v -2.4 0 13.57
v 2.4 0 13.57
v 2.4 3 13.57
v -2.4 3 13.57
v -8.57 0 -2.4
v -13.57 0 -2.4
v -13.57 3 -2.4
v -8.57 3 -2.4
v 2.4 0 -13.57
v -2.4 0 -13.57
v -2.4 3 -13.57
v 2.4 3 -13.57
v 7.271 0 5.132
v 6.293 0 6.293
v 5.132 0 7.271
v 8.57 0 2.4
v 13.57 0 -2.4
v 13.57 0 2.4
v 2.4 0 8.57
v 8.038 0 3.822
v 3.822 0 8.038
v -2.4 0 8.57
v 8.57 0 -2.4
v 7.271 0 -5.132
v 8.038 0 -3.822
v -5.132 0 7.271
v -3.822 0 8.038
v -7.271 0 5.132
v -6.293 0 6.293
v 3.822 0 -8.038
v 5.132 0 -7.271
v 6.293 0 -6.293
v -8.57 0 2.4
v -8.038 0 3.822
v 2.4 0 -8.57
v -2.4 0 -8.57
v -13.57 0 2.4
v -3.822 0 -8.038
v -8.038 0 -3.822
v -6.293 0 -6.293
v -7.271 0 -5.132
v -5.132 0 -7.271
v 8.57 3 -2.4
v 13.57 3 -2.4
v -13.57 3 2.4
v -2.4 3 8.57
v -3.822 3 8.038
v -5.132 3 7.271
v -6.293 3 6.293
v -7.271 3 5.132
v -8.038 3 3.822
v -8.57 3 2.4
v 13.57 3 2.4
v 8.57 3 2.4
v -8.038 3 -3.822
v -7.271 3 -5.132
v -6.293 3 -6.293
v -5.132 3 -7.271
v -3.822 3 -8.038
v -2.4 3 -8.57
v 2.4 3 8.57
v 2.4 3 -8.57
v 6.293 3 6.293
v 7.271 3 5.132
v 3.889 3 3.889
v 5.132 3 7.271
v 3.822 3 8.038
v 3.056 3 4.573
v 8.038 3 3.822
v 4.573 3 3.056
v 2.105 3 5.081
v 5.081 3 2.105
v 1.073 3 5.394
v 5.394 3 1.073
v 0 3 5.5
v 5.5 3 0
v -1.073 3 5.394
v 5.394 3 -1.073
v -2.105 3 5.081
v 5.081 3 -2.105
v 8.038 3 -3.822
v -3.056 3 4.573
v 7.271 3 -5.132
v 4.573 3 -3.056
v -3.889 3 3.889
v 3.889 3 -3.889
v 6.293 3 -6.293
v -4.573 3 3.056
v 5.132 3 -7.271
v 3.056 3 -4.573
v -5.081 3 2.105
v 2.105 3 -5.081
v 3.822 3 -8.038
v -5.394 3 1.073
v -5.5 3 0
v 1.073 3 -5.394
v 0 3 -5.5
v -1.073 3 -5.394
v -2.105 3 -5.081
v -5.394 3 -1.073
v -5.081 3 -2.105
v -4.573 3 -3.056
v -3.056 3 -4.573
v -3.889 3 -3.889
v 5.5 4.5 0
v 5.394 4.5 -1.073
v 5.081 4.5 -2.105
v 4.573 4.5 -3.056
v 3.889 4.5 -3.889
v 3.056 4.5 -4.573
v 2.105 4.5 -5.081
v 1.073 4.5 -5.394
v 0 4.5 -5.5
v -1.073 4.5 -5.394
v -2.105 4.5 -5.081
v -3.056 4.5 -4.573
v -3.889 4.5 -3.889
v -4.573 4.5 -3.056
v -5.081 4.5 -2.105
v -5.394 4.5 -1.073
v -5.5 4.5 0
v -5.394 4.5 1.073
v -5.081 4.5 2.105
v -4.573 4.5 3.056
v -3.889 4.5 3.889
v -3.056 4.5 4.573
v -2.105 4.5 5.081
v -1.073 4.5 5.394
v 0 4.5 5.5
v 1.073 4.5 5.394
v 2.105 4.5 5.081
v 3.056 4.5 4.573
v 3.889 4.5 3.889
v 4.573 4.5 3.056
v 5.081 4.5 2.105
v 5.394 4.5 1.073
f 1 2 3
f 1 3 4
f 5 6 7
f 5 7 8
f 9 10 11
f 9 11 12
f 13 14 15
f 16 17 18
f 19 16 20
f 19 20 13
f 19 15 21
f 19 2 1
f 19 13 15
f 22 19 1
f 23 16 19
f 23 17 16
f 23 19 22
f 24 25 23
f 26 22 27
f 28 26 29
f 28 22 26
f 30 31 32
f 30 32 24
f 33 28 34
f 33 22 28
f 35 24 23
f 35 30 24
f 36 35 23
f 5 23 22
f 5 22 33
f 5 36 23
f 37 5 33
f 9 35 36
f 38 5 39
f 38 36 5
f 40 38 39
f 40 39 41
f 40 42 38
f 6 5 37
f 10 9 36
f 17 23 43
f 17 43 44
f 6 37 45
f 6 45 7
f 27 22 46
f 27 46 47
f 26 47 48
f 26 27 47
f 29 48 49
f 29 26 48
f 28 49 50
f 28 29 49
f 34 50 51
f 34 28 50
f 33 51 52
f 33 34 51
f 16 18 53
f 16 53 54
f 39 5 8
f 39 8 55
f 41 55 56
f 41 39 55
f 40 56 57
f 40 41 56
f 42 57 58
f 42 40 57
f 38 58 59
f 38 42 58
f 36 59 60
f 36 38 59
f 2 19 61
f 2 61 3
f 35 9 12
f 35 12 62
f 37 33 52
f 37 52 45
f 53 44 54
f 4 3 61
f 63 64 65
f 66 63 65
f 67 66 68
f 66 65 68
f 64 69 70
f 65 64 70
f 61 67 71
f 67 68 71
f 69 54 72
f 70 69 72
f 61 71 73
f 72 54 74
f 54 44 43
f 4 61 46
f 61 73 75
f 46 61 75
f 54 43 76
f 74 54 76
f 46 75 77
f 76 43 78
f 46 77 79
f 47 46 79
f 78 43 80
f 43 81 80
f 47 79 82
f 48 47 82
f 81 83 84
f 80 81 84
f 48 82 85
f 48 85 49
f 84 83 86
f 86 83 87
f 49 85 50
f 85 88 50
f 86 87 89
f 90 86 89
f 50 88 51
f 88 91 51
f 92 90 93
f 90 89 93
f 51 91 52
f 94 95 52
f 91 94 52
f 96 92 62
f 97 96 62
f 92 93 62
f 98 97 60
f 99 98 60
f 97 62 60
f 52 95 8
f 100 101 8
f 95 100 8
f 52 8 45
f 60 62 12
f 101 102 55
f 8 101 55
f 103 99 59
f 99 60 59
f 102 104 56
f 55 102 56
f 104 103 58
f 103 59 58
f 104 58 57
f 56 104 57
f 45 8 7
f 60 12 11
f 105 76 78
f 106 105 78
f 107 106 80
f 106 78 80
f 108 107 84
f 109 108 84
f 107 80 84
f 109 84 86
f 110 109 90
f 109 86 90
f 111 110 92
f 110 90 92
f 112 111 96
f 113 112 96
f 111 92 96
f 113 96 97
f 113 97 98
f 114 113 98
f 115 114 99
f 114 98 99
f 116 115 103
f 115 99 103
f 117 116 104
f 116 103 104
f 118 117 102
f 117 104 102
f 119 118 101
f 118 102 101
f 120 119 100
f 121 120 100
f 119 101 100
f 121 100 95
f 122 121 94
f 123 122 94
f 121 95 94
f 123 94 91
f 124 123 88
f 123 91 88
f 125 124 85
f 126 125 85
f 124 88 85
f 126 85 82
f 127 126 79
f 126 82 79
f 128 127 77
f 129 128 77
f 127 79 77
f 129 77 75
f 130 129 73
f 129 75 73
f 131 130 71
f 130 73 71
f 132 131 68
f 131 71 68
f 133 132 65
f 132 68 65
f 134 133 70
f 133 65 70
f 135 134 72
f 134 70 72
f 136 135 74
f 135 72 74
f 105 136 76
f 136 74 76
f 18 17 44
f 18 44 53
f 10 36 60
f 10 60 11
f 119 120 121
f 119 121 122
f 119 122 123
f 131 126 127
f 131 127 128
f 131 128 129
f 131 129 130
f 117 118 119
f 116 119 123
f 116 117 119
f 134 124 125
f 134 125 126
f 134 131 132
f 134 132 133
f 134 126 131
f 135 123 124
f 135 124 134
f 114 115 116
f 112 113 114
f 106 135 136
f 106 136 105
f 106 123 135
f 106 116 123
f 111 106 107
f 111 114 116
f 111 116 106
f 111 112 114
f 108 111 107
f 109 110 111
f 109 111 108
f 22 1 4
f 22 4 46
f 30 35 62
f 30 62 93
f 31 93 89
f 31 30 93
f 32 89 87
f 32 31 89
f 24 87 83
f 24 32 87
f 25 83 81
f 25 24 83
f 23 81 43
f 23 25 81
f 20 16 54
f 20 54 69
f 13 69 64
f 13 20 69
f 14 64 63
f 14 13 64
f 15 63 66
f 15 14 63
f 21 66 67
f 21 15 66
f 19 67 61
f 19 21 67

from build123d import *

# Parameters (mm, degrees)
EXTRUDE_1_DEPTH = 3
SKETCH_2_R      = 5.5
EXTRUDE_2_DEPTH = 1.5


with BuildPart() as part:
    # 草图1 → 凸台-拉伸1 (new body)
    with BuildSketch(Plane(origin=(0, 0, 0), x_dir=(1, 0, 0), z_dir=(0, 1, 0))):
        with BuildLine():
            Line((-13.570297544, 2.4), (-8.570297544, 2.4))
            ThreePointArc((-8.570297544, 2.4), (-6.293250353, 6.293250353), (-2.4, 8.570297544))
            Line((-2.4, 8.570297544), (-2.4, 13.570297544))
            Line((-2.4, 13.570297544), (2.4, 13.570297544))
            Line((2.4, 13.570297544), (2.4, 8.570297544))
            ThreePointArc((2.4, 8.570297544), (6.293250353, 6.293250353), (8.570297544, 2.4))
            Line((8.570297544, 2.4), (13.570297544, 2.4))
            Line((13.570297544, 2.4), (13.570297544, -2.4))
            Line((13.570297544, -2.4), (8.570297544, -2.4))
            ThreePointArc((8.570297544, -2.4), (6.293250353, -6.293250353), (2.4, -8.570297544))
            Line((2.4, -8.570297544), (2.4, -13.570297544))
            Line((2.4, -13.570297544), (-2.4, -13.570297544))
            Line((-2.4, -13.570297544), (-2.4, -8.570297544))
            ThreePointArc((-2.4, -8.570297544), (-6.293250353, -6.293250353), (-8.570297544, -2.4))
            Line((-8.570297544, -2.4), (-13.570297544, -2.4))
            Line((-13.570297544, -2.4), (-13.570297544, 2.4))
        make_face()
    extrude(amount=EXTRUDE_1_DEPTH)

    # 草图2 → 凸台-拉伸2 (add)
    with BuildSketch(Plane(origin=(0, 3, 0), x_dir=(1, 0, 0), z_dir=(0, 1, 0))):
        Circle(SKETCH_2_R)
    extrude(amount=EXTRUDE_2_DEPTH)


solid = part.part
